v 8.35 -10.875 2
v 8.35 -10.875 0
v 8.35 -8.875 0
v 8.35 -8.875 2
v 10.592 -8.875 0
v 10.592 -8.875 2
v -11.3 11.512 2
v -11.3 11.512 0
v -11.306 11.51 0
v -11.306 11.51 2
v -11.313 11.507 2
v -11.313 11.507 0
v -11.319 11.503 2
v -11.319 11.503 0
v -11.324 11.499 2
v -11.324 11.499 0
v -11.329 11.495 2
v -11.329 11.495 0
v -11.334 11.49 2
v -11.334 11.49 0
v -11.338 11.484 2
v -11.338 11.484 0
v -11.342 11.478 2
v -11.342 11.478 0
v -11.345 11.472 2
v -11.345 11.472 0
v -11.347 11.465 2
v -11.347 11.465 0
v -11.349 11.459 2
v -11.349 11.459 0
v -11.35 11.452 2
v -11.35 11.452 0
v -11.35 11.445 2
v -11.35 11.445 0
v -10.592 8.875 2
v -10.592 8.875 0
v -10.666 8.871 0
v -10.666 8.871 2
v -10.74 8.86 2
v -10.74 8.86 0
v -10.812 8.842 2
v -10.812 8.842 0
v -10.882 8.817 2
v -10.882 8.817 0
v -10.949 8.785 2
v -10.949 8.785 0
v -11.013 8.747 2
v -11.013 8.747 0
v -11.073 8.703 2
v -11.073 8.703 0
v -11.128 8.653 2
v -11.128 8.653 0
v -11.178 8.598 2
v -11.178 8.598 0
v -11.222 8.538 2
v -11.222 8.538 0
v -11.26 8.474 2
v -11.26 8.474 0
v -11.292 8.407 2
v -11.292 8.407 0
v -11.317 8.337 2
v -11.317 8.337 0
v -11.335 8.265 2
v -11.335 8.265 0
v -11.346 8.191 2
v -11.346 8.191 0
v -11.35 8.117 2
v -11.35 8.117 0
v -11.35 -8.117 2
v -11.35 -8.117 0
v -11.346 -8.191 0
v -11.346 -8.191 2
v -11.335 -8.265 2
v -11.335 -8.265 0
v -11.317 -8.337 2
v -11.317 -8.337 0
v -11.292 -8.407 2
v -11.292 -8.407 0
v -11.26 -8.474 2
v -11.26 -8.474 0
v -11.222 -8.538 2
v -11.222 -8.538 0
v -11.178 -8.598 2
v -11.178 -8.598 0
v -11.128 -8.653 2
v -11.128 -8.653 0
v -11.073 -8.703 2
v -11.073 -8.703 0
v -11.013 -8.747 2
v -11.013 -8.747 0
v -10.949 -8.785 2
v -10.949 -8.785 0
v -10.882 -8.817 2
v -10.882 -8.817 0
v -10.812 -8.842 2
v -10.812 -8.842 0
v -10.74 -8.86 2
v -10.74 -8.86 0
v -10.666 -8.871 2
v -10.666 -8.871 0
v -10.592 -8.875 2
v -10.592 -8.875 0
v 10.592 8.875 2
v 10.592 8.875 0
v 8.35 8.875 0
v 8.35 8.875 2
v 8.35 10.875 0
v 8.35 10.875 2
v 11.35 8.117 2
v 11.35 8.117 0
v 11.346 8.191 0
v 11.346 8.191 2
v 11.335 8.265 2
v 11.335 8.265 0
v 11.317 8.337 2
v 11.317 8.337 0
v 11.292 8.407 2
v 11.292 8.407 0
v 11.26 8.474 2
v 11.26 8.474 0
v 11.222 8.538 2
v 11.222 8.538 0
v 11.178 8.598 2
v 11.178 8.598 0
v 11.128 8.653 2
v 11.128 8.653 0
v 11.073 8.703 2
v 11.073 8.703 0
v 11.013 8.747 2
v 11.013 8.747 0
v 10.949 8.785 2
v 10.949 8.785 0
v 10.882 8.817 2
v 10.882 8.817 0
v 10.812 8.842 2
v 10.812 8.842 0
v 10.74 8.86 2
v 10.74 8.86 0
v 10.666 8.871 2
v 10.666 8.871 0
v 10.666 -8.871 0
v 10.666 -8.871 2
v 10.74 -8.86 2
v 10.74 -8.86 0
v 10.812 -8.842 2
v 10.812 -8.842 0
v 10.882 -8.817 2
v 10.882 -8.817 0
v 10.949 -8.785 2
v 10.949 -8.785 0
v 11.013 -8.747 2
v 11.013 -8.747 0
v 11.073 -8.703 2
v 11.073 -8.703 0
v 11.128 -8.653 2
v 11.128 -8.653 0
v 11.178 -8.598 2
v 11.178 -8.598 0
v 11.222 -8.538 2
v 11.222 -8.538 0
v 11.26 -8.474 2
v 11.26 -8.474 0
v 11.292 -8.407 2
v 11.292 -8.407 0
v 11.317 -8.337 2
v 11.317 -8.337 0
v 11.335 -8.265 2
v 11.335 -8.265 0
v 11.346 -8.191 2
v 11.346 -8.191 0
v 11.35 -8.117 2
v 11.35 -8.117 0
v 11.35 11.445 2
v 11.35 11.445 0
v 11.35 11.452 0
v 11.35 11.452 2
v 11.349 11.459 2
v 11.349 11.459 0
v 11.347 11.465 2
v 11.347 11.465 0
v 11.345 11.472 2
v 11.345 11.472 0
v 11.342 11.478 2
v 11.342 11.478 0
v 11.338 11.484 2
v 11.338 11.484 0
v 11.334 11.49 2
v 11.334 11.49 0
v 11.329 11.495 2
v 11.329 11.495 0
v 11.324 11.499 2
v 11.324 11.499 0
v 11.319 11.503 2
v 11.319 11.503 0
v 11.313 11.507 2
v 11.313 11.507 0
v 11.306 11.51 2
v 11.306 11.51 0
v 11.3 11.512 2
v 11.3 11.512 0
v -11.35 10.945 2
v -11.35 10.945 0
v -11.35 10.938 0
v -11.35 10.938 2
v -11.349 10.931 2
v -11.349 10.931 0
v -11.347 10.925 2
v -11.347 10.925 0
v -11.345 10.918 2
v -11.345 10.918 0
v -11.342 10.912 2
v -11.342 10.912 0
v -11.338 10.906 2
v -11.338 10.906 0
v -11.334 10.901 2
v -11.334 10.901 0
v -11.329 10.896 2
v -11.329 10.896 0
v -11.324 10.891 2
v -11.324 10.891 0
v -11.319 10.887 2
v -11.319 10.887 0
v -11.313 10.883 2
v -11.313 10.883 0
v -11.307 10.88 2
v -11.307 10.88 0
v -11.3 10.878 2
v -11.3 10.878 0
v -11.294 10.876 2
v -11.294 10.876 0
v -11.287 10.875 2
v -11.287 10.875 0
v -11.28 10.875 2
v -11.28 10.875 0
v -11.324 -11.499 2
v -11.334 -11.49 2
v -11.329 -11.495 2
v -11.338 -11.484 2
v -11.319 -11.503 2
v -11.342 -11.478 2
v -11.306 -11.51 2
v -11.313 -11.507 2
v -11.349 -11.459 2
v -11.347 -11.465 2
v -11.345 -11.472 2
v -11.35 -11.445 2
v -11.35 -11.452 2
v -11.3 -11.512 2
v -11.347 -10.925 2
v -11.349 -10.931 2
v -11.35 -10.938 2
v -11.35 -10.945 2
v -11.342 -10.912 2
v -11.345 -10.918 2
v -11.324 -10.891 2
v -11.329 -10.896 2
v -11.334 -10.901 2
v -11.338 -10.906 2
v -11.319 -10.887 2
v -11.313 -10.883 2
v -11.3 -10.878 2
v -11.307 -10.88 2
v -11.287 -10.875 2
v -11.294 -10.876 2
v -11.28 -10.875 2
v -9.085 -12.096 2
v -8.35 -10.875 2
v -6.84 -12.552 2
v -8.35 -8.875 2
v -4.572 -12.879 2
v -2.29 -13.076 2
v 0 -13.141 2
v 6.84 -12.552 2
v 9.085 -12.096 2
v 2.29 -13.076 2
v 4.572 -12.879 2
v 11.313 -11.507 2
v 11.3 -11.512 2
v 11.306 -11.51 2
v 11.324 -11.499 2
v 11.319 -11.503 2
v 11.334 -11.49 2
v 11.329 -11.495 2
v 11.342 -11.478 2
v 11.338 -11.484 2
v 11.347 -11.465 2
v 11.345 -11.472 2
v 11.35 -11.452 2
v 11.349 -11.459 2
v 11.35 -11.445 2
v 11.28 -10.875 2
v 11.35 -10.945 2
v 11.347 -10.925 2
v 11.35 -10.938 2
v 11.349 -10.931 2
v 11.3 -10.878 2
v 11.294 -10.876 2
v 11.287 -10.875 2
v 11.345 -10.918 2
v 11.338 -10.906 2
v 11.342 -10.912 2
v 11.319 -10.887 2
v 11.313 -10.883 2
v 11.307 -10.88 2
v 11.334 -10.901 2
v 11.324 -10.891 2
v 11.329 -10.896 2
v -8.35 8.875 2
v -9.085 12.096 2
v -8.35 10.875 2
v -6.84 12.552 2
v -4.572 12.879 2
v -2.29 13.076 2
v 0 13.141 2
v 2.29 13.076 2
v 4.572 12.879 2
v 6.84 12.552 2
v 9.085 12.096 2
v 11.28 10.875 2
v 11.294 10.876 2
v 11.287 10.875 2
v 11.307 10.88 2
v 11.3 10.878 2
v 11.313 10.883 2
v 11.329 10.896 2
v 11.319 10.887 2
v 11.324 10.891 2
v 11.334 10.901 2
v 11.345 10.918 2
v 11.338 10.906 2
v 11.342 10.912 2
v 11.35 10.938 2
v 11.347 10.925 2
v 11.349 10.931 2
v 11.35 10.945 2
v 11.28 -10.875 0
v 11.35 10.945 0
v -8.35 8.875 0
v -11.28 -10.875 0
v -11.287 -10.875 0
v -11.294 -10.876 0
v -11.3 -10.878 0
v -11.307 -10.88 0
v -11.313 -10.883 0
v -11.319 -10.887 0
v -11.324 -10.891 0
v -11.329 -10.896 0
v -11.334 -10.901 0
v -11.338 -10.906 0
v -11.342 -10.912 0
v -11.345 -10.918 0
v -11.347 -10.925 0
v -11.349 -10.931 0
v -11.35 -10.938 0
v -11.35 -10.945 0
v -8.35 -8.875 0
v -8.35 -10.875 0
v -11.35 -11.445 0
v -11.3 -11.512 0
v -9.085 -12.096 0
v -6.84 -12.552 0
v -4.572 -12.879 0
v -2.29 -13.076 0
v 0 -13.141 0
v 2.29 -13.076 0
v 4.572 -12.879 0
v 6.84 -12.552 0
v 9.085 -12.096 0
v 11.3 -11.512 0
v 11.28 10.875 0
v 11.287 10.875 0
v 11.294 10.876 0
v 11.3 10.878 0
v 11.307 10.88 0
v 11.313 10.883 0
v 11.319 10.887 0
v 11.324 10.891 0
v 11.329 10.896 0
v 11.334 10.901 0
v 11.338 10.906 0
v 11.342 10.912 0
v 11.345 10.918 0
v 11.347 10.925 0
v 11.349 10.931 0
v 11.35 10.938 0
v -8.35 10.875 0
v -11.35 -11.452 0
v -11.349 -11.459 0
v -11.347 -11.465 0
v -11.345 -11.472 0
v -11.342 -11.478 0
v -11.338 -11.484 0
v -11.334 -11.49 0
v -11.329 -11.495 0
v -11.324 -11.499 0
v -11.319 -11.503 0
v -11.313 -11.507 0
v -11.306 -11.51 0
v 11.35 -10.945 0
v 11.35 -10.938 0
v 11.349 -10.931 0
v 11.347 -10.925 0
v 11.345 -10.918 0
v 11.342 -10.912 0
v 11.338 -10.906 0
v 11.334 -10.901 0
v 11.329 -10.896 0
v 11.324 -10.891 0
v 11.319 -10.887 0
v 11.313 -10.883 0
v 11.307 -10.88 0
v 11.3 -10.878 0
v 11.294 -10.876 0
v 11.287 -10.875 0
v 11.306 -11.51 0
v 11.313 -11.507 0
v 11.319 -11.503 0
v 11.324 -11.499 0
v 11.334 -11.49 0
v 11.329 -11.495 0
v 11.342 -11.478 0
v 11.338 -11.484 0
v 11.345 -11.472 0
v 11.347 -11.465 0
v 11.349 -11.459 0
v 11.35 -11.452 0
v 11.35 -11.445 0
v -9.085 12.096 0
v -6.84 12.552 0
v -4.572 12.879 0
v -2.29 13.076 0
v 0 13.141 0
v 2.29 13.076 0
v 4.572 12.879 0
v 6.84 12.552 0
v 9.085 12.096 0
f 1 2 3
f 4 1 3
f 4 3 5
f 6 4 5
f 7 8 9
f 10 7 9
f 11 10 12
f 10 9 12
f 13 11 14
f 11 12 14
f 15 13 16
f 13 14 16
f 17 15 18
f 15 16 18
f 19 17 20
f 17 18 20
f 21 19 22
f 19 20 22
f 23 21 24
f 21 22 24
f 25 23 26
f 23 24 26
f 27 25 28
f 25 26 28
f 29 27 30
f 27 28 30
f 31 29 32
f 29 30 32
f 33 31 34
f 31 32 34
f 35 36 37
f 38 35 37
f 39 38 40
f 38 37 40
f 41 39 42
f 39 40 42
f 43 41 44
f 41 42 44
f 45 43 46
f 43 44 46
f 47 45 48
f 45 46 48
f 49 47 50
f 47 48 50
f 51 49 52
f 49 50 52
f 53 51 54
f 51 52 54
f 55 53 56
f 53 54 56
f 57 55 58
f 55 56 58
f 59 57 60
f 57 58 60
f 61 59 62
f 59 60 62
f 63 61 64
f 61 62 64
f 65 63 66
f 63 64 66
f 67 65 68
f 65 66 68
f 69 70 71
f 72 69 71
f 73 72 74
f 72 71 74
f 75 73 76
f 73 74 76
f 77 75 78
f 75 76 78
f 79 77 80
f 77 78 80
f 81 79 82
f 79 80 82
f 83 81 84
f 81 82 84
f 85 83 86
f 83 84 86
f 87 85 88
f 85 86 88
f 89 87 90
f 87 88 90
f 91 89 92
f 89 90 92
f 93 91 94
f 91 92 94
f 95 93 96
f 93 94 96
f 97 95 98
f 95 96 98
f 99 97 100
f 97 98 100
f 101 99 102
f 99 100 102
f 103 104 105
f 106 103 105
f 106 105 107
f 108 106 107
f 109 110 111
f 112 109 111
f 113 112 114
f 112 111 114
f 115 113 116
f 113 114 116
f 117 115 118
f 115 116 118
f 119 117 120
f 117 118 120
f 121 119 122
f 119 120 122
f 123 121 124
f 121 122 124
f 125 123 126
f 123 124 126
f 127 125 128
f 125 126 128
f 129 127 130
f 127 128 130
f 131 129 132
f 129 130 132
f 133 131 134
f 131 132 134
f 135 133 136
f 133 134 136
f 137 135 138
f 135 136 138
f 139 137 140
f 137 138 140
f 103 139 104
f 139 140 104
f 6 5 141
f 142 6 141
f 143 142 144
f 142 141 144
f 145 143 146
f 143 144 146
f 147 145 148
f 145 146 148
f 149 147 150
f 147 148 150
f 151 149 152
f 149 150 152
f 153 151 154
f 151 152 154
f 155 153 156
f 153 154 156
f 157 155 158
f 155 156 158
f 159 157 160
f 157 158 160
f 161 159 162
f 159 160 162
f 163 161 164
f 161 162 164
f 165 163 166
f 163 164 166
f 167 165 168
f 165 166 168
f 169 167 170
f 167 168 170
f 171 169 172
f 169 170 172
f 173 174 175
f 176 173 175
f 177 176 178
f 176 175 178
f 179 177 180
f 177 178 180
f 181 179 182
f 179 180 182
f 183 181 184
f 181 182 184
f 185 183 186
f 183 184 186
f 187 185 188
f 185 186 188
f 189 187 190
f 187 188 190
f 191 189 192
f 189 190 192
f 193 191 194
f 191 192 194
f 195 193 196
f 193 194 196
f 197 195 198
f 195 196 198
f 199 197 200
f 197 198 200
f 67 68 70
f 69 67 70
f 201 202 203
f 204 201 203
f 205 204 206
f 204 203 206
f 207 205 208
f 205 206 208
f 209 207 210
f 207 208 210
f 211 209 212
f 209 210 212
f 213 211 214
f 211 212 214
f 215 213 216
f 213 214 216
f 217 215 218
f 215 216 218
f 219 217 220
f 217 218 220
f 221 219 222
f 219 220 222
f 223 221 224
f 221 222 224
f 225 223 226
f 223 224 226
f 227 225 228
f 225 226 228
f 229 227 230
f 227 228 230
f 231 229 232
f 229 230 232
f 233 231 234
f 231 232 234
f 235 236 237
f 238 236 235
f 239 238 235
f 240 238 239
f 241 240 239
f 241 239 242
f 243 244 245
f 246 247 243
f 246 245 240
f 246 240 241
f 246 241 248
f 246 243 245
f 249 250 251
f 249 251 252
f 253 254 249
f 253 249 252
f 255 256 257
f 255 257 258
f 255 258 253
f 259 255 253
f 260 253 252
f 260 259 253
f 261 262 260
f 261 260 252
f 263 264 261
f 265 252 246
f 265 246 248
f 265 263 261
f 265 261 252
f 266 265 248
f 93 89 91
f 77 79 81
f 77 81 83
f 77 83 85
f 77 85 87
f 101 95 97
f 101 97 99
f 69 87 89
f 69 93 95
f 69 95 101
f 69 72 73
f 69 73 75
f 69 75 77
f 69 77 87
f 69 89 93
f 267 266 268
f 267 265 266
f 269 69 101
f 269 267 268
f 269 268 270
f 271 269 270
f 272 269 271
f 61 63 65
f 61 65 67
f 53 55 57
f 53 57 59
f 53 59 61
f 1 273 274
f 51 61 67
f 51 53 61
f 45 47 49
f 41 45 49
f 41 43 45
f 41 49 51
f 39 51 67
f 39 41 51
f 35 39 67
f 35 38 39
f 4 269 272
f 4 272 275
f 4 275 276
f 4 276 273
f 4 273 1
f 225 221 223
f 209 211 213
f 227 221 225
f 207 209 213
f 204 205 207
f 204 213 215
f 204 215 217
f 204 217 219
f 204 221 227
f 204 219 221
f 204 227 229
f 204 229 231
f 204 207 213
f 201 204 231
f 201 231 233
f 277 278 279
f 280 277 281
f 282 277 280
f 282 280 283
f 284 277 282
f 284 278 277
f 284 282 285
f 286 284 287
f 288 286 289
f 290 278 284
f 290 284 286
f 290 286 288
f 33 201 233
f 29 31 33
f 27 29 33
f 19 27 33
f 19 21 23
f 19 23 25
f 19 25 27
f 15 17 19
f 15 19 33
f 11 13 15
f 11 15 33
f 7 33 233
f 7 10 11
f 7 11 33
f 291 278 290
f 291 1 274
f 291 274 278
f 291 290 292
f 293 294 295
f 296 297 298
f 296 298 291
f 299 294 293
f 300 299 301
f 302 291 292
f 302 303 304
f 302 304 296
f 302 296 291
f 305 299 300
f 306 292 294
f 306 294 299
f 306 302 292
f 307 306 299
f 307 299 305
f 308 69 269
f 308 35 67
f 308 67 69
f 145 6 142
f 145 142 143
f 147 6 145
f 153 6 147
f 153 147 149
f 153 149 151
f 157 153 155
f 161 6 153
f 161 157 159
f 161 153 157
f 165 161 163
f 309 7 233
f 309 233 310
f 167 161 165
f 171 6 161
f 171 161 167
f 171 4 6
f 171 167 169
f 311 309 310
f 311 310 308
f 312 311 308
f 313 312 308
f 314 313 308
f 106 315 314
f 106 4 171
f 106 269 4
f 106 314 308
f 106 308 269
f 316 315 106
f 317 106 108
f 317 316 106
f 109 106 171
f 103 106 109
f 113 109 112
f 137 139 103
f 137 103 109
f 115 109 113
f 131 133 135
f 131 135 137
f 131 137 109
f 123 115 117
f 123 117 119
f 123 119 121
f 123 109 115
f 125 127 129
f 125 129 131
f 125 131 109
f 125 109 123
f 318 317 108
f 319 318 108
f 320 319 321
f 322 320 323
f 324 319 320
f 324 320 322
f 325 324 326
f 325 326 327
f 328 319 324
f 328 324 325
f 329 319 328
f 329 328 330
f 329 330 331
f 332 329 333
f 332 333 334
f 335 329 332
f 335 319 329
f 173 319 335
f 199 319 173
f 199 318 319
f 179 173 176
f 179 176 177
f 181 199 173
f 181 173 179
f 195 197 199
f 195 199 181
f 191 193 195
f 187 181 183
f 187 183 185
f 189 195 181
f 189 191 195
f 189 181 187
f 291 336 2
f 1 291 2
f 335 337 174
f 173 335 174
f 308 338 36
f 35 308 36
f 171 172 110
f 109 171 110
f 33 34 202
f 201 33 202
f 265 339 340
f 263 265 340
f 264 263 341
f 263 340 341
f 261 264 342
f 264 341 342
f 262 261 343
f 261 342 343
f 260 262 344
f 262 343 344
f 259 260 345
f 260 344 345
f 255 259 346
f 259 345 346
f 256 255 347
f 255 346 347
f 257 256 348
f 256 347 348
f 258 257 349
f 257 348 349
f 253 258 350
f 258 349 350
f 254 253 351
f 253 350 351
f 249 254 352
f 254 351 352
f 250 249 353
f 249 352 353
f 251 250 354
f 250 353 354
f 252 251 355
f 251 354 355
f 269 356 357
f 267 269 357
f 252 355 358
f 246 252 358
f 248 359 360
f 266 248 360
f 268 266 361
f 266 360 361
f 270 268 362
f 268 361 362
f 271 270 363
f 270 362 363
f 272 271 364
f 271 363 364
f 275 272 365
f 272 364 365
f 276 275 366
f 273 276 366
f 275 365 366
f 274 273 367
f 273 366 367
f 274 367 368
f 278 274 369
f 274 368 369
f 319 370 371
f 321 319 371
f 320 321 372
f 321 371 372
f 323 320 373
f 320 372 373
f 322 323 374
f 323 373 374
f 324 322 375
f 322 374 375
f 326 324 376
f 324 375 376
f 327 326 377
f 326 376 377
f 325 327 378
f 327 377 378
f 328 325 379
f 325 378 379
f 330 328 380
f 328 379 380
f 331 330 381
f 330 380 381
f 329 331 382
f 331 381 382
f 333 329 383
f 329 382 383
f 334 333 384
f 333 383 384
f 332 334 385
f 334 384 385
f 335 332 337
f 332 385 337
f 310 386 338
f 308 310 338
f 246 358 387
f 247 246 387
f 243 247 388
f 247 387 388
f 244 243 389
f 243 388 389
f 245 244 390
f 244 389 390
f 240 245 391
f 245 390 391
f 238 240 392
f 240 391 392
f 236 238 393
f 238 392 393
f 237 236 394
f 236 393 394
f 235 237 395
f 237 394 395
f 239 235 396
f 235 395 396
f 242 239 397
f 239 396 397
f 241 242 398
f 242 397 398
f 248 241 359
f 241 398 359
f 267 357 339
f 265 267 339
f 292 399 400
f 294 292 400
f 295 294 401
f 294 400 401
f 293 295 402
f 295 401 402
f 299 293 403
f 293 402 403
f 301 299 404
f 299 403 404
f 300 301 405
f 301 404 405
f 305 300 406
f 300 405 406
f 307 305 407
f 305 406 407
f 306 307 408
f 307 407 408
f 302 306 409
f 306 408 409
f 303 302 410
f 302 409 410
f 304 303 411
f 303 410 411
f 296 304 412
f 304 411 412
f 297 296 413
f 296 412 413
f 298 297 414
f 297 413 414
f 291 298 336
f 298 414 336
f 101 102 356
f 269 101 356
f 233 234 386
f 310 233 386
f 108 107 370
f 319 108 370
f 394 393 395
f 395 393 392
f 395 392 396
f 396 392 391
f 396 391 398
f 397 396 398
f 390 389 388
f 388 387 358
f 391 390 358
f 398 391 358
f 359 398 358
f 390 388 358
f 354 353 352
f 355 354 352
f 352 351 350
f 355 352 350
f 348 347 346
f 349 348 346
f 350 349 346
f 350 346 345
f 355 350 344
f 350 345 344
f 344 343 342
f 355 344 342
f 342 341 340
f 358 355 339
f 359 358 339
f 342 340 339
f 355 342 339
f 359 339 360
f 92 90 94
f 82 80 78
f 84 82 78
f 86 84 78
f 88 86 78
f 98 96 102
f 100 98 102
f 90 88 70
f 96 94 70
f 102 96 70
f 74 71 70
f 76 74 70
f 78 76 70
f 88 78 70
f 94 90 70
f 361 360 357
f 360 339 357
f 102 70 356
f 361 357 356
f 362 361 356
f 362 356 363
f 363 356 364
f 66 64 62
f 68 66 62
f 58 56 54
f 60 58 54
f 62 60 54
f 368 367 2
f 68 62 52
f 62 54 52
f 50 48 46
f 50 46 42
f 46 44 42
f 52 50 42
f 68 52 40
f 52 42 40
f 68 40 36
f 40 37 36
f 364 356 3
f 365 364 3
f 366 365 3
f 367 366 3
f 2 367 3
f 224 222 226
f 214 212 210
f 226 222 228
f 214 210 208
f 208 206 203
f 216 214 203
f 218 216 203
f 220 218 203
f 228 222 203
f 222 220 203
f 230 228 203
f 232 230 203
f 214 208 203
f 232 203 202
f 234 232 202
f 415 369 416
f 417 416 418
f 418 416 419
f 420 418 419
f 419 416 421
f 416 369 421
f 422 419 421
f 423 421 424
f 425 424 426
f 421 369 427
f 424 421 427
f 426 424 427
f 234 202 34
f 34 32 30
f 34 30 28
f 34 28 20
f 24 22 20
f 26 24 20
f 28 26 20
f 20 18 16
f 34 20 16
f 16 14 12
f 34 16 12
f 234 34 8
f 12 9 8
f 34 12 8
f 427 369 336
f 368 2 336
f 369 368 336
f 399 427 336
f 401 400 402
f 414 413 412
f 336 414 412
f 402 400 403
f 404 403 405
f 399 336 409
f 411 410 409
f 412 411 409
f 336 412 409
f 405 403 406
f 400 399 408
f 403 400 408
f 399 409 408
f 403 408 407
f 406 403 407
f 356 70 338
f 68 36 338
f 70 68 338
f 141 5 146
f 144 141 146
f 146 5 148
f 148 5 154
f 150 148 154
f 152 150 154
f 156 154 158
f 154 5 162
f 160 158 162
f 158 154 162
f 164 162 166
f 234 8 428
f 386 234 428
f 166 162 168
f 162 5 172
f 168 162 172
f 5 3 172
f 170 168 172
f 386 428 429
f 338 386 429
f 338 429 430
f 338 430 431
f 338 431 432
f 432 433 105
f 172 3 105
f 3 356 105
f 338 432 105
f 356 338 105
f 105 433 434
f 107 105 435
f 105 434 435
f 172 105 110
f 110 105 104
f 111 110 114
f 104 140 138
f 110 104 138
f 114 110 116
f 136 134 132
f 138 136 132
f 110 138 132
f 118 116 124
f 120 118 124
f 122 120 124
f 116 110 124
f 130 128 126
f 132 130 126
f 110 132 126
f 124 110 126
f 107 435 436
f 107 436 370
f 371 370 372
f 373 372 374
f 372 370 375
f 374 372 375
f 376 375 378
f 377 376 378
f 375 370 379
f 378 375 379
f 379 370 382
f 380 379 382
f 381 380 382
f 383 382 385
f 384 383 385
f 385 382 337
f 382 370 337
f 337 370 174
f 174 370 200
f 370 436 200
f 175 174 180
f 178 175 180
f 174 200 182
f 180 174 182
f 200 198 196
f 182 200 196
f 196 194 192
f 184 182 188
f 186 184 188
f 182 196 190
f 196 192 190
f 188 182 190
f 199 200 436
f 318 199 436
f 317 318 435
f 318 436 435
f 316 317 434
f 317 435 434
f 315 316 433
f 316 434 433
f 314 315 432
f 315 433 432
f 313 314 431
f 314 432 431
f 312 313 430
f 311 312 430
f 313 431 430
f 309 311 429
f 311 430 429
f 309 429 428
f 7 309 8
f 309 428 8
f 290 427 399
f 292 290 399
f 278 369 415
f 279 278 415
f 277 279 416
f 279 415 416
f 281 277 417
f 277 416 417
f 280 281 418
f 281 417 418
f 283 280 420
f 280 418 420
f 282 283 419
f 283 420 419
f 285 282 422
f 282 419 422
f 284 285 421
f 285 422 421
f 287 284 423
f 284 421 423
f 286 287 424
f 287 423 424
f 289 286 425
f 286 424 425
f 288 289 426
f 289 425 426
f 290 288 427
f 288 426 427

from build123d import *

# Parameters (mm, degrees)
EXTRUDE_1_DEPTH = 2


with BuildPart() as part:
    # 草图1 → 凸台-拉伸1 (new body)
    with BuildSketch(Plane.XY):
        with BuildLine():
            Line((8.35, 10.875), (11.28, 10.875))
            ThreePointArc((11.28, 10.875), (11.329497475, 10.895502525), (11.35, 10.945))
            Line((11.35, 10.945), (11.35, 11.445))
            ThreePointArc((11.35, 11.445), (11.336054538, 11.486927185), (11.299774606, 11.512148827))
            ThreePointArc((11.299774606, 11.512148827), (0, 13.14139051), (-11.299774606, 11.512148827))
            ThreePointArc((-11.299774606, 11.512148827), (-11.336054538, 11.486927185), (-11.35, 11.445))
            Line((-11.35, 11.445), (-11.35, 10.945))
            ThreePointArc((-11.35, 10.945), (-11.329497475, 10.895502525), (-11.28, 10.875))
            Line((-11.28, 10.875), (-8.35, 10.875))
            Line((-8.35, 10.875), (-8.35, 8.875))
            Line((-8.35, 8.875), (-10.591620109, 8.875))
            ThreePointArc((-10.591620109, 8.875), (-11.127875673, 8.652875673), (-11.35, 8.116620109))
            Line((-11.35, 8.116620109), (-11.35, -8.116620109))
            ThreePointArc((-11.35, -8.116620109), (-11.127875673, -8.652875673), (-10.591620109, -8.875))
            Line((-10.591620109, -8.875), (-8.35, -8.875))
            Line((-8.35, -8.875), (-8.35, -10.875))
            Line((-8.35, -10.875), (-11.28, -10.875))
            ThreePointArc((-11.28, -10.875), (-11.329497475, -10.895502525), (-11.35, -10.945))
            Line((-11.35, -10.945), (-11.35, -11.445))
            ThreePointArc((-11.35, -11.445), (-11.336054538, -11.486927185), (-11.299774606, -11.512148827))
            ThreePointArc((-11.299774606, -11.512148827), (0, -13.14139051), (11.299774606, -11.512148827))
            ThreePointArc((11.299774606, -11.512148827), (11.336054538, -11.486927185), (11.35, -11.445))
            Line((11.35, -11.445), (11.35, -10.945))
            ThreePointArc((11.35, -10.945), (11.329497475, -10.895502525), (11.28, -10.875))
            Line((11.28, -10.875), (8.35, -10.875))
            Line((8.35, -10.875), (8.35, -8.875))
            Line((8.35, -8.875), (10.591620109, -8.875))
            ThreePointArc((10.591620109, -8.875), (11.127875673, -8.652875673), (11.35, -8.116620109))
            Line((11.35, -8.116620109), (11.35, 8.116620109))
            ThreePointArc((11.35, 8.116620109), (11.127875673, 8.652875673), (10.591620109, 8.875))
            Line((10.591620109, 8.875), (8.35, 8.875))
            Line((8.35, 8.875), (8.35, 10.875))
        make_face()
    extrude(amount=EXTRUDE_1_DEPTH)


solid = part.part
